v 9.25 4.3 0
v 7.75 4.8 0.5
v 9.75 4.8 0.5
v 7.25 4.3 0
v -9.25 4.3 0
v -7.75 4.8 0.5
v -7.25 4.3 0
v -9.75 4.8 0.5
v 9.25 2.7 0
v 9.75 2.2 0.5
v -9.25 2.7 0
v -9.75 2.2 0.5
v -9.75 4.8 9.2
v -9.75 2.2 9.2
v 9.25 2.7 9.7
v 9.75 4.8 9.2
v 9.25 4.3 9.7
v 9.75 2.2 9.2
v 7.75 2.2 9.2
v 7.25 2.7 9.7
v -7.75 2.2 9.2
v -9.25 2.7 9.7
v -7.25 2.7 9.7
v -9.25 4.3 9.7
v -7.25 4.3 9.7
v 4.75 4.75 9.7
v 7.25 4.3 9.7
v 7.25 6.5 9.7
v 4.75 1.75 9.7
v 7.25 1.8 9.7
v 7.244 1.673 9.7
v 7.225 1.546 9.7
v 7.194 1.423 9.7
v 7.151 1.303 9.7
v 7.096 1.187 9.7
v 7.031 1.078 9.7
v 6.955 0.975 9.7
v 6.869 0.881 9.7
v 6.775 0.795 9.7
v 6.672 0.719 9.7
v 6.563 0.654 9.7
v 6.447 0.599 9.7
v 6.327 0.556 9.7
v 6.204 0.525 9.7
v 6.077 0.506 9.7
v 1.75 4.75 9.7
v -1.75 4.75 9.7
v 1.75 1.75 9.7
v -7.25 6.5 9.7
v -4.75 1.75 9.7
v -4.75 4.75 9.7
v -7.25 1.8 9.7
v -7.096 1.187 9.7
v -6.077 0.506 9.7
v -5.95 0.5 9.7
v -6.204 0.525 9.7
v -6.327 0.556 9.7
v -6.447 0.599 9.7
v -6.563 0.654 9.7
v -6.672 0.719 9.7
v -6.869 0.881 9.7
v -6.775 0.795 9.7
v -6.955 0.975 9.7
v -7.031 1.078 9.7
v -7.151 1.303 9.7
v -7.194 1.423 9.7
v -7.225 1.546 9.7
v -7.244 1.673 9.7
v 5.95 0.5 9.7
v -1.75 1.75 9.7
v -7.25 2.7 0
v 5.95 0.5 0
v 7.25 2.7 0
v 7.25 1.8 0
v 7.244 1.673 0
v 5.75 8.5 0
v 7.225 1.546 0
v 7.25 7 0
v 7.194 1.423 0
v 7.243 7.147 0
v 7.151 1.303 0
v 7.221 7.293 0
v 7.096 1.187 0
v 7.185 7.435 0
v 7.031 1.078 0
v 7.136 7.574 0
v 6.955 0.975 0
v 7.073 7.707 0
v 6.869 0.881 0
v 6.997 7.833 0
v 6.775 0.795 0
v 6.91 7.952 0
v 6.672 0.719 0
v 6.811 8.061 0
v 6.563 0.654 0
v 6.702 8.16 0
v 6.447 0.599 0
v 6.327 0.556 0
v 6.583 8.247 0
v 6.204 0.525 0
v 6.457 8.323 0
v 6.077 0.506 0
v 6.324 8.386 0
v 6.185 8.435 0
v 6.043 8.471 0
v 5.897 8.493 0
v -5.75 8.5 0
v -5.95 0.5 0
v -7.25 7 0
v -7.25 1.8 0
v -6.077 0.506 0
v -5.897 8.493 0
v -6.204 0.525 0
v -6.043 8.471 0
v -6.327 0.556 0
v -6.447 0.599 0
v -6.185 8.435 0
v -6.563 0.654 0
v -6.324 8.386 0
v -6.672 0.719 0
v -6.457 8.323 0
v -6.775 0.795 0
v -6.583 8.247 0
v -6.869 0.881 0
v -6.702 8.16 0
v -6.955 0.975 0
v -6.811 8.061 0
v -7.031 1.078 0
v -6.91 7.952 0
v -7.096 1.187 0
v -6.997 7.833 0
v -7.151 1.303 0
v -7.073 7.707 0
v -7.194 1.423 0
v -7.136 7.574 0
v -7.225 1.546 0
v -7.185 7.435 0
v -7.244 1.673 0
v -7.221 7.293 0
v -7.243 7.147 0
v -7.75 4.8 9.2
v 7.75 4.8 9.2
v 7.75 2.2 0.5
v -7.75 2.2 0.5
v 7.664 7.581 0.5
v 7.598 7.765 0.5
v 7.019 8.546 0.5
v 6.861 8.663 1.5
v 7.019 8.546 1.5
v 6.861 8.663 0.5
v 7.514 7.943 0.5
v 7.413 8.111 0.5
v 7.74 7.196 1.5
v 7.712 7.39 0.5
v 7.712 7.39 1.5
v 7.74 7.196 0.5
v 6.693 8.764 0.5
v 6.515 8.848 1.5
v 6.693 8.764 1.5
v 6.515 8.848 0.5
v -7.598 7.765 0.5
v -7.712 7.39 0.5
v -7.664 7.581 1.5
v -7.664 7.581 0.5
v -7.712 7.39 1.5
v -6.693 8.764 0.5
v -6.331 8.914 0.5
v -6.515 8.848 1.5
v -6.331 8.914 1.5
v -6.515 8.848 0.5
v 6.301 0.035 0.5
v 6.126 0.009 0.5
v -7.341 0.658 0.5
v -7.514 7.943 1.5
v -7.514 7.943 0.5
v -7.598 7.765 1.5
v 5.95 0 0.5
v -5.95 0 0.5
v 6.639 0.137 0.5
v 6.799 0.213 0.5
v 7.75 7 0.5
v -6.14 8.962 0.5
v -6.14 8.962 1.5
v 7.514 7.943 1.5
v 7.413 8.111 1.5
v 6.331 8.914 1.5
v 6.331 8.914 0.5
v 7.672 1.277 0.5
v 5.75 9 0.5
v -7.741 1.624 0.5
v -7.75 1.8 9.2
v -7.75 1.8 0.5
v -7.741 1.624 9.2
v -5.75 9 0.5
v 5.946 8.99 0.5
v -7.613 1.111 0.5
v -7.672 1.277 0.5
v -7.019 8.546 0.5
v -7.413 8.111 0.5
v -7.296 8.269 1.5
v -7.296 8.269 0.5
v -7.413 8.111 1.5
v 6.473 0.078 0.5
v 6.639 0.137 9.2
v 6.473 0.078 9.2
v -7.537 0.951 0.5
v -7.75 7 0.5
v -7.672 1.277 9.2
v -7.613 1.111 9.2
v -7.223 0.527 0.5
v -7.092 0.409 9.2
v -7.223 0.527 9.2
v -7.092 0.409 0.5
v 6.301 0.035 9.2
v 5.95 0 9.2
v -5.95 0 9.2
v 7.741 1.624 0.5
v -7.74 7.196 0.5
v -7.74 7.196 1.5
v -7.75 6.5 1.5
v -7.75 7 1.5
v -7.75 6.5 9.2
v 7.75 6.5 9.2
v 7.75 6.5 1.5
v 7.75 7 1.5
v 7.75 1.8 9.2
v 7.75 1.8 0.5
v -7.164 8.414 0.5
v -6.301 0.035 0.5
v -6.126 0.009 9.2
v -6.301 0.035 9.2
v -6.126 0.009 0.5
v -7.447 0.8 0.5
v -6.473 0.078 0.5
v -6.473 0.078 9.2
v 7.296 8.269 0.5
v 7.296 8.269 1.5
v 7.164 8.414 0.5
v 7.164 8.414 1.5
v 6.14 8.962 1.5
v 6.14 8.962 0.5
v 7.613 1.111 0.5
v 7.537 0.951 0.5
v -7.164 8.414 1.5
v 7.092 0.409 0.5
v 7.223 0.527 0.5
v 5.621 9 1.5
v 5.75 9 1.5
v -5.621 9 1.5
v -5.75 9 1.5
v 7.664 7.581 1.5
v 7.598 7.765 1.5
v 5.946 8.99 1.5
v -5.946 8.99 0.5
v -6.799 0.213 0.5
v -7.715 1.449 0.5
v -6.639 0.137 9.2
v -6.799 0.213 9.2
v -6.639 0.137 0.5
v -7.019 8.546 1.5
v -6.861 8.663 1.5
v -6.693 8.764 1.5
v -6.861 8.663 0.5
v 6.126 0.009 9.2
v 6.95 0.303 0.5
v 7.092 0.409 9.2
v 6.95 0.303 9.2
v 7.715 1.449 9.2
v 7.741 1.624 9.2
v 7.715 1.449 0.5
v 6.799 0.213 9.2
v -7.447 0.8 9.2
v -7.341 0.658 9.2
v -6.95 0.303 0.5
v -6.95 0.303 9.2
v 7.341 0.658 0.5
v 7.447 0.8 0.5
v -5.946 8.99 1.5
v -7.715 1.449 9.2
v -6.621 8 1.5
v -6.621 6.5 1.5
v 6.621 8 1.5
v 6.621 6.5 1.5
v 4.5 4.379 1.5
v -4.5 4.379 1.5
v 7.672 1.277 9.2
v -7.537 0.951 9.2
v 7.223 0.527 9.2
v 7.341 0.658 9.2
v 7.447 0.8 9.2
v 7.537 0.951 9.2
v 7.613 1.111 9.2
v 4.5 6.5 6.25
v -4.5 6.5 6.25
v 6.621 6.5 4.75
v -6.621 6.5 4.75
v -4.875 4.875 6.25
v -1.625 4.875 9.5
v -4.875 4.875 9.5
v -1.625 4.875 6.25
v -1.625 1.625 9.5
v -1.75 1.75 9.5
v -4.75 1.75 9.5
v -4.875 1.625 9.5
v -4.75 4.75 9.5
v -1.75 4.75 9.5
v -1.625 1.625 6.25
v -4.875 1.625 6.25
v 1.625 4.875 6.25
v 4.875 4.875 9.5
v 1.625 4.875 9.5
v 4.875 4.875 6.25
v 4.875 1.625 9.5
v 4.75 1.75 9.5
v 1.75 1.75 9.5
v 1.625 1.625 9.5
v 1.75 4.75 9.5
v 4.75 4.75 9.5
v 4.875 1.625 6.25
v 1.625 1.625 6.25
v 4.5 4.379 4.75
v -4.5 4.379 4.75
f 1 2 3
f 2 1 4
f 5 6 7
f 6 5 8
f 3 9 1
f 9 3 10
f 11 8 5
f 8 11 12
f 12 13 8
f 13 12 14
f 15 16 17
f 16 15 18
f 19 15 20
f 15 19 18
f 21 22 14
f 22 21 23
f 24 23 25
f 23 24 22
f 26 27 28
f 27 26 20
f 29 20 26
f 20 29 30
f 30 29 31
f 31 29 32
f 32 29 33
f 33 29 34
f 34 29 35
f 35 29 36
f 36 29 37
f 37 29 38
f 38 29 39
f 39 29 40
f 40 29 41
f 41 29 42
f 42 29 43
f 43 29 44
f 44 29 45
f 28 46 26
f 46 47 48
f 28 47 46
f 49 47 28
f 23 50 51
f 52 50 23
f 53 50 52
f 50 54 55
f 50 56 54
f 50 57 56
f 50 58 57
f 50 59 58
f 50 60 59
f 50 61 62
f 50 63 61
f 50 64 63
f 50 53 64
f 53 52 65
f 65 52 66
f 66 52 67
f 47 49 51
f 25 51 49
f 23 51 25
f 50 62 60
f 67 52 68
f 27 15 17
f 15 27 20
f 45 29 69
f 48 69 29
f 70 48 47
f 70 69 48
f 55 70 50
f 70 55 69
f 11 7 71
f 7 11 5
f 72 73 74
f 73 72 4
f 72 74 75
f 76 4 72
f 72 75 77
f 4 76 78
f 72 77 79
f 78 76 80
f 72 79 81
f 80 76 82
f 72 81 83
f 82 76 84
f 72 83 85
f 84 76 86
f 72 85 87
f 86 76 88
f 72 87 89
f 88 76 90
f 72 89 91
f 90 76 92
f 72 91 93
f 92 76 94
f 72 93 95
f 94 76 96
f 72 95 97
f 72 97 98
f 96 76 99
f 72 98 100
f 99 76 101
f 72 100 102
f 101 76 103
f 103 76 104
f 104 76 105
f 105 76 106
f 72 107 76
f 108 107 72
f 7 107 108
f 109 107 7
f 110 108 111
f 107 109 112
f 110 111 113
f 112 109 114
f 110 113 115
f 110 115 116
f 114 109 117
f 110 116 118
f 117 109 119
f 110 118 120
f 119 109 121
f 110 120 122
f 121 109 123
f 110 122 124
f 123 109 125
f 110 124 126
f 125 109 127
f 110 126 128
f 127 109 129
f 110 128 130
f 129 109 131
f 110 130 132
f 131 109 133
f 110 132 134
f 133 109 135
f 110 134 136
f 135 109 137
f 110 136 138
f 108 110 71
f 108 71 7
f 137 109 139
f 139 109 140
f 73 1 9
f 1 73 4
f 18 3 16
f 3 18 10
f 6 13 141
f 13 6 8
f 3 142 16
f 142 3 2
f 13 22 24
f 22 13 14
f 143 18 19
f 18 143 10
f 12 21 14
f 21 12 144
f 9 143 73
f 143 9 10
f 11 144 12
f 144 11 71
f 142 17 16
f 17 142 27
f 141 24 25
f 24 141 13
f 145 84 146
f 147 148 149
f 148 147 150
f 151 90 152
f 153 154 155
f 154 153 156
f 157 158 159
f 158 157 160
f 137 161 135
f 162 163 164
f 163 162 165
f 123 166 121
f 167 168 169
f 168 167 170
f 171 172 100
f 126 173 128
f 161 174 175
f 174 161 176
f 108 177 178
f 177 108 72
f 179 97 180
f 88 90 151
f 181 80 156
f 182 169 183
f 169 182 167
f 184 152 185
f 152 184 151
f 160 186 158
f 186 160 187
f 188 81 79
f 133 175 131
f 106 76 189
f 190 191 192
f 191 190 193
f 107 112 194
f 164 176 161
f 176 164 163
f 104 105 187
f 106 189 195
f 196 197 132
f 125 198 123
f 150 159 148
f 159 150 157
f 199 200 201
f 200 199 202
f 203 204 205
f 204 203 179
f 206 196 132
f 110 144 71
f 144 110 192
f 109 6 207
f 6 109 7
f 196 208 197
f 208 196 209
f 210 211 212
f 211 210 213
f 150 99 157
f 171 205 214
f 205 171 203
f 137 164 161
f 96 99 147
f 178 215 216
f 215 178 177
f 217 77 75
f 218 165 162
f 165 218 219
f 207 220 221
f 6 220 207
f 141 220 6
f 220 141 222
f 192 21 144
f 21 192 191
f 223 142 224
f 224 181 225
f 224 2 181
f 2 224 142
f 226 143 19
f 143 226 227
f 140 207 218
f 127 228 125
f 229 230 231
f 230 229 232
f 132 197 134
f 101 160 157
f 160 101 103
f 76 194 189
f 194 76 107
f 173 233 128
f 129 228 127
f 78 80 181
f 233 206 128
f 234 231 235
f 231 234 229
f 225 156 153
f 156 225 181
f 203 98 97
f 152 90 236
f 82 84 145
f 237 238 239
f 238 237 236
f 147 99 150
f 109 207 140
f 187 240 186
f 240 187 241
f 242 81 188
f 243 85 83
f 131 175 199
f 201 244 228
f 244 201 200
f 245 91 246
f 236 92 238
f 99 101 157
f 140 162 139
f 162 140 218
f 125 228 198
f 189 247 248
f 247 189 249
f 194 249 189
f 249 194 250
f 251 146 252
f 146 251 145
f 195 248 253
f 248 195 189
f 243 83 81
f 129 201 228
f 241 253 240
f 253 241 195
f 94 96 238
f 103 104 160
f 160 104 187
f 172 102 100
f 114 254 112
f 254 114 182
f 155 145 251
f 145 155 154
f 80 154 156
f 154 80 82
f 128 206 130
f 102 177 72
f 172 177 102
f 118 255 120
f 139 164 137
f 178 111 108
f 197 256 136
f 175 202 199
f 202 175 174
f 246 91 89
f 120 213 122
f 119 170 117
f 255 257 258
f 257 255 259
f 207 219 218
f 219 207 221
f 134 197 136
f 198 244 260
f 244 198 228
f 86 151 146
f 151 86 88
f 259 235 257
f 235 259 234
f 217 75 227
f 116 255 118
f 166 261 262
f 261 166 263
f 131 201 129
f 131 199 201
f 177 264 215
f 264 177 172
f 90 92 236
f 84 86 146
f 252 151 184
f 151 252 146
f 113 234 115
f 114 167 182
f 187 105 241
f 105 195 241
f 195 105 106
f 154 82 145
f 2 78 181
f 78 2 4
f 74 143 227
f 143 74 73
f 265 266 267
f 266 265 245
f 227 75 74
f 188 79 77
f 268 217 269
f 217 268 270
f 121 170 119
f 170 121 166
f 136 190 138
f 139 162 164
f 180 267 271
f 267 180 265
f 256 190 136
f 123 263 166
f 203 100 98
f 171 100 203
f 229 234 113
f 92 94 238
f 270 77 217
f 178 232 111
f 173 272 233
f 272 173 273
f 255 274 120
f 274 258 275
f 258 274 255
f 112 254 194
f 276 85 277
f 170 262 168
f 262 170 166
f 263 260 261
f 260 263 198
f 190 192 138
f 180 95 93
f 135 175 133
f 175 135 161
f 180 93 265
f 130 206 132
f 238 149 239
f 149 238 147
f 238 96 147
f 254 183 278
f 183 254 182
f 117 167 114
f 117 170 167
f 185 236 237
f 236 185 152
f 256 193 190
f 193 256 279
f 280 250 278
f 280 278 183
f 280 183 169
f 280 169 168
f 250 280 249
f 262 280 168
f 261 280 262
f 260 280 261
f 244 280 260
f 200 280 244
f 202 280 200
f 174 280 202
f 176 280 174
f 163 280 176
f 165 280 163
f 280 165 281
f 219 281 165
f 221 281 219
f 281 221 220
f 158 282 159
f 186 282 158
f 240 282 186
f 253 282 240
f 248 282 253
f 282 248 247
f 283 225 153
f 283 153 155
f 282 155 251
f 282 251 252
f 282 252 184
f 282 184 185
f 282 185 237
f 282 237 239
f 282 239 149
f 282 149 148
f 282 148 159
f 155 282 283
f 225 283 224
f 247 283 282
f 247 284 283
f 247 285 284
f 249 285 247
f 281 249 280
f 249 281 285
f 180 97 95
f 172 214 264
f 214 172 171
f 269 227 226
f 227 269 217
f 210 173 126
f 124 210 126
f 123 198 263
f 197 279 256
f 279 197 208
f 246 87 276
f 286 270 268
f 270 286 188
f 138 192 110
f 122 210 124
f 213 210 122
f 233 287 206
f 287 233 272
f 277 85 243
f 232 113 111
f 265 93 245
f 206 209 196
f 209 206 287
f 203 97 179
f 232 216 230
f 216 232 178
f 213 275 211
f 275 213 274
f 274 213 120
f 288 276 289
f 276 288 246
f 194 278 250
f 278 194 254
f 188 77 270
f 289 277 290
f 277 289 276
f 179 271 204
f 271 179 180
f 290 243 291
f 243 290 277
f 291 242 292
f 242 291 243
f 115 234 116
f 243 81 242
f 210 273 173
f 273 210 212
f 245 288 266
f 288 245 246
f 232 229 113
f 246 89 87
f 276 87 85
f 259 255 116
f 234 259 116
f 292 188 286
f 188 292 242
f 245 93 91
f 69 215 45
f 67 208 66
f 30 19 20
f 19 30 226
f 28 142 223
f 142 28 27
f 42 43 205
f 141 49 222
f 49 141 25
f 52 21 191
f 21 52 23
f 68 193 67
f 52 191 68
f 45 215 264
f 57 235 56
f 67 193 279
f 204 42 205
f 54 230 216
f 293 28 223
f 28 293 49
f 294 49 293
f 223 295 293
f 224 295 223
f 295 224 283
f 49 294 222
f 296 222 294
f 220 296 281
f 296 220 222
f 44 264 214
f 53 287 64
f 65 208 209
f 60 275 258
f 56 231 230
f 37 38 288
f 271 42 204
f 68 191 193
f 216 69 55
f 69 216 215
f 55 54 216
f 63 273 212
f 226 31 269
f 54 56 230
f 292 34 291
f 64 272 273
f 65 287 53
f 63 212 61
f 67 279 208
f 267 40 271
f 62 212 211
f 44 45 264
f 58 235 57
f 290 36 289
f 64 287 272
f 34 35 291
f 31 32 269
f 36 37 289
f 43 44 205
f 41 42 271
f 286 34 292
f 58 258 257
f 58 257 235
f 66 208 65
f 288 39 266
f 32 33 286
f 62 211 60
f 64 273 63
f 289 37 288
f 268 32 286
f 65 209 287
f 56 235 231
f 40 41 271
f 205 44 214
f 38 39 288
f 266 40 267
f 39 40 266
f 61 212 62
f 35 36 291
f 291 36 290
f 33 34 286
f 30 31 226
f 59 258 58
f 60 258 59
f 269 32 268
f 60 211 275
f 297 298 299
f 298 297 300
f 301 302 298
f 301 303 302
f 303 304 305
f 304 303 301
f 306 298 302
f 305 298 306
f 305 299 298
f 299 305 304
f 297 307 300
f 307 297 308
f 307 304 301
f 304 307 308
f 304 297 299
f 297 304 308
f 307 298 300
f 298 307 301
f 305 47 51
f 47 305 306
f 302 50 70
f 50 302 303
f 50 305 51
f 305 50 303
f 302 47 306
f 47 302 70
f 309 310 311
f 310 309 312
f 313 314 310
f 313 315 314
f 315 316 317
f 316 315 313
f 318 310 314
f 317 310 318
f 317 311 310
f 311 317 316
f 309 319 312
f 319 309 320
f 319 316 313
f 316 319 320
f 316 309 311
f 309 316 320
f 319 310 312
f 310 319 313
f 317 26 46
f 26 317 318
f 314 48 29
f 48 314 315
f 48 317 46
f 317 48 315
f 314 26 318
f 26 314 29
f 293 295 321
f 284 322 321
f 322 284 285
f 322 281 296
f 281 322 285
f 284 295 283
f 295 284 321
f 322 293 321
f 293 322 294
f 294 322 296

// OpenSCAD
// file: ../../lib/utils.scad
include <../variables.scad>

use <Round-Anything/polyround.scad>


module mirrorCopy(v, mirrorOffset=0) {
  children();

  translate([v[0]*mirrorOffset, v[1]*mirrorOffset, v[2]*mirrorOffset])
  mirror(v)
  translate([-v[0]*mirrorOffset, -v[1]*mirrorOffset, -v[2]*mirrorOffset])
  children();
}


module draft(vertical, offs) {
  hull() {
    translate([0, 0, vertical])linear_extrude(0.01)children();
    linear_extrude(0.01)offset(offs)children();
  }
}

module roundedCube(dimen, radii) {
  if (is_num(radii)) {
    radii = [radii, radii, radii, radii];
  }

  linear_extrude(dimen[2])
  polygon(polyRound([
    [0, 0, radii[0]],
    [dimen[0], 0, radii[1]],
    [dimen[0], dimen[1], radii[2]],
    [0, dimen[1], radii[3]],
  ], fn=$pfn));
}

module HeatsetInsertHole(bottom=false) {
  translate([0, 0, bottom ? 0 : -HeatsetInsert_height])
  cylinder(d=HeatsetInsert_diameter, h=HeatsetInsert_height);
}

function roundedRectangle(width, height, radius) =
  polyRound([
    [width/2, height/2, radius],
    [-width/2, height/2, radius],
    [-width/2, -height/2, radius],
    [width/2, -height/2, radius],
  ], fn=$pfn);


module ChamferPyramid(l)       polyhedron(
  points=[ [l,l,0],[l,-l,0],[-l,-l,0],[-l,l,0], 
           [0,0,l]  ],                                 
  faces=[ [0,1,4],[1,2,4],[2,3,4],[3,0,4],             
              [1,0,3],[2,1,3] ]                     
 );
// main file
include <../../variables.scad>
include <../../lib/utils.scad>


$fn = 64;
inf = 0.01; // infinitesimal thicknes for slabs in hull - can be increased to see if offsets were done right.
depth = UsbCover_depth+UsbCover_foot_length;


module 2DBase(inset=0) {
    // inset is required for chamfer
    UsbCover_r1=UsbCover_r1-inset;
    UsbCover_r2=UsbCover_r2-inset;
    rMax=max(UsbCover_r1,UsbCover_r2);
    
    // one side of the rounded rectangle
    difference(){
      offset(r=UsbCover_r1) square([depth-UsbCover_r1*2-inset*2,UsbCover_width-UsbCover_r1*2-inset*2],center=true);   
      translate([depth/4 + rMax/2,0])square([depth/2+rMax,UsbCover_width+rMax], center=true);
    }
    // other side - slightly different radius
    difference(){
      offset(r=UsbCover_r2) square([depth-UsbCover_r2*2-inset*2,UsbCover_width-UsbCover_r2*2-inset*2],center=true);     
      translate([-(depth/4 + rMax/2),0])square([depth/2+rMax,UsbCover_width+rMax], center=true);
    }
}

module 2DRail(inset=0)
{
    // only the side rail
    translate([-depth/2+UsbCover_wing_width/2+UsbCover_wing_offset,0,0])square([UsbCover_wing_width-inset*2,UsbCover_width+2*UsbCover_wing_length-inset*2],center=true);
}

module 2DTop(inset=0) {
    // the top shape is the bottom shape with a cutoff at the edge
    difference() {
        2DBase(inset=inset);
        translate([7.4,0])square([depth+UsbCover_r1,UsbCover_width+UsbCover_r1],center=true);
    }
}


module UsbCoverMainBody(chamfer=0.5, clearance=0) {
    // translation into world coordinates


    if (clearance > 0) {
        minkowski(){
            USBPlugBody(chamfer=0,clearance=0);
            cylinder(r=clearance,h=clearance);
        }
    } else {    
        rotate([0,0,90])translate([depth/2,0,0]) {
            //rail with chamfer top and bottom
            hull() {
                linear_extrude(0.01){2DRail(inset=chamfer);}
                translate([0,0,chamfer])linear_extrude(inf){2DRail(inset=0);}
                translate([0,0,UsbCover_height-chamfer-inf])linear_extrude(inf){2DRail(inset=0);}
                translate([0,0,UsbCover_height-inf])linear_extrude(inf){2DRail(inset=chamfer);}
            }
            // bottom with chamfer up to grip
            hull()
            {
                linear_extrude(0.01){2DBase(inset=chamfer);}
                translate([0,0,chamfer])linear_extrude(inf){2DBase(inset=0);}
                translate([0,0,UsbCover_foot_height-inf])linear_extrude(inf){2DBase(inset=0);}
            }
            // top with chamfer
            hull(){
                translate([0,0,UsbCover_foot_height])linear_extrude(inf){2DTop(inset=0);}
                translate([0,0,UsbCover_height-chamfer-inf])linear_extrude(inf){2DTop(inset=0);}
                translate([0,0,UsbCover_height-inf])linear_extrude(inf){2DTop(inset=chamfer);}
            }
            //top chamfers are moved down by slice thickness
        }
    }
}

module MagnetHole() {
    // a cube with clearance and a smaller section on top that grips the magnet.
    {
          translate([-UsbCover_magnet_clearance/2,-UsbCover_magnet_clearance/2,-UsbCover_magnet_clearance])
             cube(UsbCover_magnet_size+UsbCover_magnet_clearance,center=false);
          translate([0,0,inf])
             cube([UsbCover_magnet_size,UsbCover_magnet_size,UsbCover_magnet_depth+inf]);
      }
  }

module MagnetHoles() {
    // translation into world coordinates
    rotate([0,0,90])translate([depth/2,0,0])
    for (i=[-1,1])
        translate([-UsbCover_magnet_size/2-depth/2+UsbCover_depth/2,-UsbCover_magnet_size/2-i*UsbCover_magnet_spacing/2,UsbCover_height-UsbCover_magnet_depth]) MagnetHole();
}


module 3DGripMould(){
    // translation into world coordinates
    rotate([0,0,90])translate([depth/2,0,0])
    
    // a lengthy "cube" minkowski-summed with a pyramid
    translate([depth/2-UsbCover_foot_length,-UsbCover_indent_width/2+UsbCover_indent_depth,UsbCover_foot_height])minkowski(){
       //pyramid
       rotate([0,0,45])ChamferPyramid(UsbCover_indent_depth);
       //cube
       cube([UsbCover_indent_depth, UsbCover_indent_width-2*UsbCover_indent_depth, UsbCover_indent_height-UsbCover_indent_depth/2]);
    }
}
    
module UsbCover(chamfer=0.5){
    difference(){
        UsbCoverMainBody(chamfer=chamfer);
        3DGripMould();
        MagnetHoles();
    }
}


UsbCover();
